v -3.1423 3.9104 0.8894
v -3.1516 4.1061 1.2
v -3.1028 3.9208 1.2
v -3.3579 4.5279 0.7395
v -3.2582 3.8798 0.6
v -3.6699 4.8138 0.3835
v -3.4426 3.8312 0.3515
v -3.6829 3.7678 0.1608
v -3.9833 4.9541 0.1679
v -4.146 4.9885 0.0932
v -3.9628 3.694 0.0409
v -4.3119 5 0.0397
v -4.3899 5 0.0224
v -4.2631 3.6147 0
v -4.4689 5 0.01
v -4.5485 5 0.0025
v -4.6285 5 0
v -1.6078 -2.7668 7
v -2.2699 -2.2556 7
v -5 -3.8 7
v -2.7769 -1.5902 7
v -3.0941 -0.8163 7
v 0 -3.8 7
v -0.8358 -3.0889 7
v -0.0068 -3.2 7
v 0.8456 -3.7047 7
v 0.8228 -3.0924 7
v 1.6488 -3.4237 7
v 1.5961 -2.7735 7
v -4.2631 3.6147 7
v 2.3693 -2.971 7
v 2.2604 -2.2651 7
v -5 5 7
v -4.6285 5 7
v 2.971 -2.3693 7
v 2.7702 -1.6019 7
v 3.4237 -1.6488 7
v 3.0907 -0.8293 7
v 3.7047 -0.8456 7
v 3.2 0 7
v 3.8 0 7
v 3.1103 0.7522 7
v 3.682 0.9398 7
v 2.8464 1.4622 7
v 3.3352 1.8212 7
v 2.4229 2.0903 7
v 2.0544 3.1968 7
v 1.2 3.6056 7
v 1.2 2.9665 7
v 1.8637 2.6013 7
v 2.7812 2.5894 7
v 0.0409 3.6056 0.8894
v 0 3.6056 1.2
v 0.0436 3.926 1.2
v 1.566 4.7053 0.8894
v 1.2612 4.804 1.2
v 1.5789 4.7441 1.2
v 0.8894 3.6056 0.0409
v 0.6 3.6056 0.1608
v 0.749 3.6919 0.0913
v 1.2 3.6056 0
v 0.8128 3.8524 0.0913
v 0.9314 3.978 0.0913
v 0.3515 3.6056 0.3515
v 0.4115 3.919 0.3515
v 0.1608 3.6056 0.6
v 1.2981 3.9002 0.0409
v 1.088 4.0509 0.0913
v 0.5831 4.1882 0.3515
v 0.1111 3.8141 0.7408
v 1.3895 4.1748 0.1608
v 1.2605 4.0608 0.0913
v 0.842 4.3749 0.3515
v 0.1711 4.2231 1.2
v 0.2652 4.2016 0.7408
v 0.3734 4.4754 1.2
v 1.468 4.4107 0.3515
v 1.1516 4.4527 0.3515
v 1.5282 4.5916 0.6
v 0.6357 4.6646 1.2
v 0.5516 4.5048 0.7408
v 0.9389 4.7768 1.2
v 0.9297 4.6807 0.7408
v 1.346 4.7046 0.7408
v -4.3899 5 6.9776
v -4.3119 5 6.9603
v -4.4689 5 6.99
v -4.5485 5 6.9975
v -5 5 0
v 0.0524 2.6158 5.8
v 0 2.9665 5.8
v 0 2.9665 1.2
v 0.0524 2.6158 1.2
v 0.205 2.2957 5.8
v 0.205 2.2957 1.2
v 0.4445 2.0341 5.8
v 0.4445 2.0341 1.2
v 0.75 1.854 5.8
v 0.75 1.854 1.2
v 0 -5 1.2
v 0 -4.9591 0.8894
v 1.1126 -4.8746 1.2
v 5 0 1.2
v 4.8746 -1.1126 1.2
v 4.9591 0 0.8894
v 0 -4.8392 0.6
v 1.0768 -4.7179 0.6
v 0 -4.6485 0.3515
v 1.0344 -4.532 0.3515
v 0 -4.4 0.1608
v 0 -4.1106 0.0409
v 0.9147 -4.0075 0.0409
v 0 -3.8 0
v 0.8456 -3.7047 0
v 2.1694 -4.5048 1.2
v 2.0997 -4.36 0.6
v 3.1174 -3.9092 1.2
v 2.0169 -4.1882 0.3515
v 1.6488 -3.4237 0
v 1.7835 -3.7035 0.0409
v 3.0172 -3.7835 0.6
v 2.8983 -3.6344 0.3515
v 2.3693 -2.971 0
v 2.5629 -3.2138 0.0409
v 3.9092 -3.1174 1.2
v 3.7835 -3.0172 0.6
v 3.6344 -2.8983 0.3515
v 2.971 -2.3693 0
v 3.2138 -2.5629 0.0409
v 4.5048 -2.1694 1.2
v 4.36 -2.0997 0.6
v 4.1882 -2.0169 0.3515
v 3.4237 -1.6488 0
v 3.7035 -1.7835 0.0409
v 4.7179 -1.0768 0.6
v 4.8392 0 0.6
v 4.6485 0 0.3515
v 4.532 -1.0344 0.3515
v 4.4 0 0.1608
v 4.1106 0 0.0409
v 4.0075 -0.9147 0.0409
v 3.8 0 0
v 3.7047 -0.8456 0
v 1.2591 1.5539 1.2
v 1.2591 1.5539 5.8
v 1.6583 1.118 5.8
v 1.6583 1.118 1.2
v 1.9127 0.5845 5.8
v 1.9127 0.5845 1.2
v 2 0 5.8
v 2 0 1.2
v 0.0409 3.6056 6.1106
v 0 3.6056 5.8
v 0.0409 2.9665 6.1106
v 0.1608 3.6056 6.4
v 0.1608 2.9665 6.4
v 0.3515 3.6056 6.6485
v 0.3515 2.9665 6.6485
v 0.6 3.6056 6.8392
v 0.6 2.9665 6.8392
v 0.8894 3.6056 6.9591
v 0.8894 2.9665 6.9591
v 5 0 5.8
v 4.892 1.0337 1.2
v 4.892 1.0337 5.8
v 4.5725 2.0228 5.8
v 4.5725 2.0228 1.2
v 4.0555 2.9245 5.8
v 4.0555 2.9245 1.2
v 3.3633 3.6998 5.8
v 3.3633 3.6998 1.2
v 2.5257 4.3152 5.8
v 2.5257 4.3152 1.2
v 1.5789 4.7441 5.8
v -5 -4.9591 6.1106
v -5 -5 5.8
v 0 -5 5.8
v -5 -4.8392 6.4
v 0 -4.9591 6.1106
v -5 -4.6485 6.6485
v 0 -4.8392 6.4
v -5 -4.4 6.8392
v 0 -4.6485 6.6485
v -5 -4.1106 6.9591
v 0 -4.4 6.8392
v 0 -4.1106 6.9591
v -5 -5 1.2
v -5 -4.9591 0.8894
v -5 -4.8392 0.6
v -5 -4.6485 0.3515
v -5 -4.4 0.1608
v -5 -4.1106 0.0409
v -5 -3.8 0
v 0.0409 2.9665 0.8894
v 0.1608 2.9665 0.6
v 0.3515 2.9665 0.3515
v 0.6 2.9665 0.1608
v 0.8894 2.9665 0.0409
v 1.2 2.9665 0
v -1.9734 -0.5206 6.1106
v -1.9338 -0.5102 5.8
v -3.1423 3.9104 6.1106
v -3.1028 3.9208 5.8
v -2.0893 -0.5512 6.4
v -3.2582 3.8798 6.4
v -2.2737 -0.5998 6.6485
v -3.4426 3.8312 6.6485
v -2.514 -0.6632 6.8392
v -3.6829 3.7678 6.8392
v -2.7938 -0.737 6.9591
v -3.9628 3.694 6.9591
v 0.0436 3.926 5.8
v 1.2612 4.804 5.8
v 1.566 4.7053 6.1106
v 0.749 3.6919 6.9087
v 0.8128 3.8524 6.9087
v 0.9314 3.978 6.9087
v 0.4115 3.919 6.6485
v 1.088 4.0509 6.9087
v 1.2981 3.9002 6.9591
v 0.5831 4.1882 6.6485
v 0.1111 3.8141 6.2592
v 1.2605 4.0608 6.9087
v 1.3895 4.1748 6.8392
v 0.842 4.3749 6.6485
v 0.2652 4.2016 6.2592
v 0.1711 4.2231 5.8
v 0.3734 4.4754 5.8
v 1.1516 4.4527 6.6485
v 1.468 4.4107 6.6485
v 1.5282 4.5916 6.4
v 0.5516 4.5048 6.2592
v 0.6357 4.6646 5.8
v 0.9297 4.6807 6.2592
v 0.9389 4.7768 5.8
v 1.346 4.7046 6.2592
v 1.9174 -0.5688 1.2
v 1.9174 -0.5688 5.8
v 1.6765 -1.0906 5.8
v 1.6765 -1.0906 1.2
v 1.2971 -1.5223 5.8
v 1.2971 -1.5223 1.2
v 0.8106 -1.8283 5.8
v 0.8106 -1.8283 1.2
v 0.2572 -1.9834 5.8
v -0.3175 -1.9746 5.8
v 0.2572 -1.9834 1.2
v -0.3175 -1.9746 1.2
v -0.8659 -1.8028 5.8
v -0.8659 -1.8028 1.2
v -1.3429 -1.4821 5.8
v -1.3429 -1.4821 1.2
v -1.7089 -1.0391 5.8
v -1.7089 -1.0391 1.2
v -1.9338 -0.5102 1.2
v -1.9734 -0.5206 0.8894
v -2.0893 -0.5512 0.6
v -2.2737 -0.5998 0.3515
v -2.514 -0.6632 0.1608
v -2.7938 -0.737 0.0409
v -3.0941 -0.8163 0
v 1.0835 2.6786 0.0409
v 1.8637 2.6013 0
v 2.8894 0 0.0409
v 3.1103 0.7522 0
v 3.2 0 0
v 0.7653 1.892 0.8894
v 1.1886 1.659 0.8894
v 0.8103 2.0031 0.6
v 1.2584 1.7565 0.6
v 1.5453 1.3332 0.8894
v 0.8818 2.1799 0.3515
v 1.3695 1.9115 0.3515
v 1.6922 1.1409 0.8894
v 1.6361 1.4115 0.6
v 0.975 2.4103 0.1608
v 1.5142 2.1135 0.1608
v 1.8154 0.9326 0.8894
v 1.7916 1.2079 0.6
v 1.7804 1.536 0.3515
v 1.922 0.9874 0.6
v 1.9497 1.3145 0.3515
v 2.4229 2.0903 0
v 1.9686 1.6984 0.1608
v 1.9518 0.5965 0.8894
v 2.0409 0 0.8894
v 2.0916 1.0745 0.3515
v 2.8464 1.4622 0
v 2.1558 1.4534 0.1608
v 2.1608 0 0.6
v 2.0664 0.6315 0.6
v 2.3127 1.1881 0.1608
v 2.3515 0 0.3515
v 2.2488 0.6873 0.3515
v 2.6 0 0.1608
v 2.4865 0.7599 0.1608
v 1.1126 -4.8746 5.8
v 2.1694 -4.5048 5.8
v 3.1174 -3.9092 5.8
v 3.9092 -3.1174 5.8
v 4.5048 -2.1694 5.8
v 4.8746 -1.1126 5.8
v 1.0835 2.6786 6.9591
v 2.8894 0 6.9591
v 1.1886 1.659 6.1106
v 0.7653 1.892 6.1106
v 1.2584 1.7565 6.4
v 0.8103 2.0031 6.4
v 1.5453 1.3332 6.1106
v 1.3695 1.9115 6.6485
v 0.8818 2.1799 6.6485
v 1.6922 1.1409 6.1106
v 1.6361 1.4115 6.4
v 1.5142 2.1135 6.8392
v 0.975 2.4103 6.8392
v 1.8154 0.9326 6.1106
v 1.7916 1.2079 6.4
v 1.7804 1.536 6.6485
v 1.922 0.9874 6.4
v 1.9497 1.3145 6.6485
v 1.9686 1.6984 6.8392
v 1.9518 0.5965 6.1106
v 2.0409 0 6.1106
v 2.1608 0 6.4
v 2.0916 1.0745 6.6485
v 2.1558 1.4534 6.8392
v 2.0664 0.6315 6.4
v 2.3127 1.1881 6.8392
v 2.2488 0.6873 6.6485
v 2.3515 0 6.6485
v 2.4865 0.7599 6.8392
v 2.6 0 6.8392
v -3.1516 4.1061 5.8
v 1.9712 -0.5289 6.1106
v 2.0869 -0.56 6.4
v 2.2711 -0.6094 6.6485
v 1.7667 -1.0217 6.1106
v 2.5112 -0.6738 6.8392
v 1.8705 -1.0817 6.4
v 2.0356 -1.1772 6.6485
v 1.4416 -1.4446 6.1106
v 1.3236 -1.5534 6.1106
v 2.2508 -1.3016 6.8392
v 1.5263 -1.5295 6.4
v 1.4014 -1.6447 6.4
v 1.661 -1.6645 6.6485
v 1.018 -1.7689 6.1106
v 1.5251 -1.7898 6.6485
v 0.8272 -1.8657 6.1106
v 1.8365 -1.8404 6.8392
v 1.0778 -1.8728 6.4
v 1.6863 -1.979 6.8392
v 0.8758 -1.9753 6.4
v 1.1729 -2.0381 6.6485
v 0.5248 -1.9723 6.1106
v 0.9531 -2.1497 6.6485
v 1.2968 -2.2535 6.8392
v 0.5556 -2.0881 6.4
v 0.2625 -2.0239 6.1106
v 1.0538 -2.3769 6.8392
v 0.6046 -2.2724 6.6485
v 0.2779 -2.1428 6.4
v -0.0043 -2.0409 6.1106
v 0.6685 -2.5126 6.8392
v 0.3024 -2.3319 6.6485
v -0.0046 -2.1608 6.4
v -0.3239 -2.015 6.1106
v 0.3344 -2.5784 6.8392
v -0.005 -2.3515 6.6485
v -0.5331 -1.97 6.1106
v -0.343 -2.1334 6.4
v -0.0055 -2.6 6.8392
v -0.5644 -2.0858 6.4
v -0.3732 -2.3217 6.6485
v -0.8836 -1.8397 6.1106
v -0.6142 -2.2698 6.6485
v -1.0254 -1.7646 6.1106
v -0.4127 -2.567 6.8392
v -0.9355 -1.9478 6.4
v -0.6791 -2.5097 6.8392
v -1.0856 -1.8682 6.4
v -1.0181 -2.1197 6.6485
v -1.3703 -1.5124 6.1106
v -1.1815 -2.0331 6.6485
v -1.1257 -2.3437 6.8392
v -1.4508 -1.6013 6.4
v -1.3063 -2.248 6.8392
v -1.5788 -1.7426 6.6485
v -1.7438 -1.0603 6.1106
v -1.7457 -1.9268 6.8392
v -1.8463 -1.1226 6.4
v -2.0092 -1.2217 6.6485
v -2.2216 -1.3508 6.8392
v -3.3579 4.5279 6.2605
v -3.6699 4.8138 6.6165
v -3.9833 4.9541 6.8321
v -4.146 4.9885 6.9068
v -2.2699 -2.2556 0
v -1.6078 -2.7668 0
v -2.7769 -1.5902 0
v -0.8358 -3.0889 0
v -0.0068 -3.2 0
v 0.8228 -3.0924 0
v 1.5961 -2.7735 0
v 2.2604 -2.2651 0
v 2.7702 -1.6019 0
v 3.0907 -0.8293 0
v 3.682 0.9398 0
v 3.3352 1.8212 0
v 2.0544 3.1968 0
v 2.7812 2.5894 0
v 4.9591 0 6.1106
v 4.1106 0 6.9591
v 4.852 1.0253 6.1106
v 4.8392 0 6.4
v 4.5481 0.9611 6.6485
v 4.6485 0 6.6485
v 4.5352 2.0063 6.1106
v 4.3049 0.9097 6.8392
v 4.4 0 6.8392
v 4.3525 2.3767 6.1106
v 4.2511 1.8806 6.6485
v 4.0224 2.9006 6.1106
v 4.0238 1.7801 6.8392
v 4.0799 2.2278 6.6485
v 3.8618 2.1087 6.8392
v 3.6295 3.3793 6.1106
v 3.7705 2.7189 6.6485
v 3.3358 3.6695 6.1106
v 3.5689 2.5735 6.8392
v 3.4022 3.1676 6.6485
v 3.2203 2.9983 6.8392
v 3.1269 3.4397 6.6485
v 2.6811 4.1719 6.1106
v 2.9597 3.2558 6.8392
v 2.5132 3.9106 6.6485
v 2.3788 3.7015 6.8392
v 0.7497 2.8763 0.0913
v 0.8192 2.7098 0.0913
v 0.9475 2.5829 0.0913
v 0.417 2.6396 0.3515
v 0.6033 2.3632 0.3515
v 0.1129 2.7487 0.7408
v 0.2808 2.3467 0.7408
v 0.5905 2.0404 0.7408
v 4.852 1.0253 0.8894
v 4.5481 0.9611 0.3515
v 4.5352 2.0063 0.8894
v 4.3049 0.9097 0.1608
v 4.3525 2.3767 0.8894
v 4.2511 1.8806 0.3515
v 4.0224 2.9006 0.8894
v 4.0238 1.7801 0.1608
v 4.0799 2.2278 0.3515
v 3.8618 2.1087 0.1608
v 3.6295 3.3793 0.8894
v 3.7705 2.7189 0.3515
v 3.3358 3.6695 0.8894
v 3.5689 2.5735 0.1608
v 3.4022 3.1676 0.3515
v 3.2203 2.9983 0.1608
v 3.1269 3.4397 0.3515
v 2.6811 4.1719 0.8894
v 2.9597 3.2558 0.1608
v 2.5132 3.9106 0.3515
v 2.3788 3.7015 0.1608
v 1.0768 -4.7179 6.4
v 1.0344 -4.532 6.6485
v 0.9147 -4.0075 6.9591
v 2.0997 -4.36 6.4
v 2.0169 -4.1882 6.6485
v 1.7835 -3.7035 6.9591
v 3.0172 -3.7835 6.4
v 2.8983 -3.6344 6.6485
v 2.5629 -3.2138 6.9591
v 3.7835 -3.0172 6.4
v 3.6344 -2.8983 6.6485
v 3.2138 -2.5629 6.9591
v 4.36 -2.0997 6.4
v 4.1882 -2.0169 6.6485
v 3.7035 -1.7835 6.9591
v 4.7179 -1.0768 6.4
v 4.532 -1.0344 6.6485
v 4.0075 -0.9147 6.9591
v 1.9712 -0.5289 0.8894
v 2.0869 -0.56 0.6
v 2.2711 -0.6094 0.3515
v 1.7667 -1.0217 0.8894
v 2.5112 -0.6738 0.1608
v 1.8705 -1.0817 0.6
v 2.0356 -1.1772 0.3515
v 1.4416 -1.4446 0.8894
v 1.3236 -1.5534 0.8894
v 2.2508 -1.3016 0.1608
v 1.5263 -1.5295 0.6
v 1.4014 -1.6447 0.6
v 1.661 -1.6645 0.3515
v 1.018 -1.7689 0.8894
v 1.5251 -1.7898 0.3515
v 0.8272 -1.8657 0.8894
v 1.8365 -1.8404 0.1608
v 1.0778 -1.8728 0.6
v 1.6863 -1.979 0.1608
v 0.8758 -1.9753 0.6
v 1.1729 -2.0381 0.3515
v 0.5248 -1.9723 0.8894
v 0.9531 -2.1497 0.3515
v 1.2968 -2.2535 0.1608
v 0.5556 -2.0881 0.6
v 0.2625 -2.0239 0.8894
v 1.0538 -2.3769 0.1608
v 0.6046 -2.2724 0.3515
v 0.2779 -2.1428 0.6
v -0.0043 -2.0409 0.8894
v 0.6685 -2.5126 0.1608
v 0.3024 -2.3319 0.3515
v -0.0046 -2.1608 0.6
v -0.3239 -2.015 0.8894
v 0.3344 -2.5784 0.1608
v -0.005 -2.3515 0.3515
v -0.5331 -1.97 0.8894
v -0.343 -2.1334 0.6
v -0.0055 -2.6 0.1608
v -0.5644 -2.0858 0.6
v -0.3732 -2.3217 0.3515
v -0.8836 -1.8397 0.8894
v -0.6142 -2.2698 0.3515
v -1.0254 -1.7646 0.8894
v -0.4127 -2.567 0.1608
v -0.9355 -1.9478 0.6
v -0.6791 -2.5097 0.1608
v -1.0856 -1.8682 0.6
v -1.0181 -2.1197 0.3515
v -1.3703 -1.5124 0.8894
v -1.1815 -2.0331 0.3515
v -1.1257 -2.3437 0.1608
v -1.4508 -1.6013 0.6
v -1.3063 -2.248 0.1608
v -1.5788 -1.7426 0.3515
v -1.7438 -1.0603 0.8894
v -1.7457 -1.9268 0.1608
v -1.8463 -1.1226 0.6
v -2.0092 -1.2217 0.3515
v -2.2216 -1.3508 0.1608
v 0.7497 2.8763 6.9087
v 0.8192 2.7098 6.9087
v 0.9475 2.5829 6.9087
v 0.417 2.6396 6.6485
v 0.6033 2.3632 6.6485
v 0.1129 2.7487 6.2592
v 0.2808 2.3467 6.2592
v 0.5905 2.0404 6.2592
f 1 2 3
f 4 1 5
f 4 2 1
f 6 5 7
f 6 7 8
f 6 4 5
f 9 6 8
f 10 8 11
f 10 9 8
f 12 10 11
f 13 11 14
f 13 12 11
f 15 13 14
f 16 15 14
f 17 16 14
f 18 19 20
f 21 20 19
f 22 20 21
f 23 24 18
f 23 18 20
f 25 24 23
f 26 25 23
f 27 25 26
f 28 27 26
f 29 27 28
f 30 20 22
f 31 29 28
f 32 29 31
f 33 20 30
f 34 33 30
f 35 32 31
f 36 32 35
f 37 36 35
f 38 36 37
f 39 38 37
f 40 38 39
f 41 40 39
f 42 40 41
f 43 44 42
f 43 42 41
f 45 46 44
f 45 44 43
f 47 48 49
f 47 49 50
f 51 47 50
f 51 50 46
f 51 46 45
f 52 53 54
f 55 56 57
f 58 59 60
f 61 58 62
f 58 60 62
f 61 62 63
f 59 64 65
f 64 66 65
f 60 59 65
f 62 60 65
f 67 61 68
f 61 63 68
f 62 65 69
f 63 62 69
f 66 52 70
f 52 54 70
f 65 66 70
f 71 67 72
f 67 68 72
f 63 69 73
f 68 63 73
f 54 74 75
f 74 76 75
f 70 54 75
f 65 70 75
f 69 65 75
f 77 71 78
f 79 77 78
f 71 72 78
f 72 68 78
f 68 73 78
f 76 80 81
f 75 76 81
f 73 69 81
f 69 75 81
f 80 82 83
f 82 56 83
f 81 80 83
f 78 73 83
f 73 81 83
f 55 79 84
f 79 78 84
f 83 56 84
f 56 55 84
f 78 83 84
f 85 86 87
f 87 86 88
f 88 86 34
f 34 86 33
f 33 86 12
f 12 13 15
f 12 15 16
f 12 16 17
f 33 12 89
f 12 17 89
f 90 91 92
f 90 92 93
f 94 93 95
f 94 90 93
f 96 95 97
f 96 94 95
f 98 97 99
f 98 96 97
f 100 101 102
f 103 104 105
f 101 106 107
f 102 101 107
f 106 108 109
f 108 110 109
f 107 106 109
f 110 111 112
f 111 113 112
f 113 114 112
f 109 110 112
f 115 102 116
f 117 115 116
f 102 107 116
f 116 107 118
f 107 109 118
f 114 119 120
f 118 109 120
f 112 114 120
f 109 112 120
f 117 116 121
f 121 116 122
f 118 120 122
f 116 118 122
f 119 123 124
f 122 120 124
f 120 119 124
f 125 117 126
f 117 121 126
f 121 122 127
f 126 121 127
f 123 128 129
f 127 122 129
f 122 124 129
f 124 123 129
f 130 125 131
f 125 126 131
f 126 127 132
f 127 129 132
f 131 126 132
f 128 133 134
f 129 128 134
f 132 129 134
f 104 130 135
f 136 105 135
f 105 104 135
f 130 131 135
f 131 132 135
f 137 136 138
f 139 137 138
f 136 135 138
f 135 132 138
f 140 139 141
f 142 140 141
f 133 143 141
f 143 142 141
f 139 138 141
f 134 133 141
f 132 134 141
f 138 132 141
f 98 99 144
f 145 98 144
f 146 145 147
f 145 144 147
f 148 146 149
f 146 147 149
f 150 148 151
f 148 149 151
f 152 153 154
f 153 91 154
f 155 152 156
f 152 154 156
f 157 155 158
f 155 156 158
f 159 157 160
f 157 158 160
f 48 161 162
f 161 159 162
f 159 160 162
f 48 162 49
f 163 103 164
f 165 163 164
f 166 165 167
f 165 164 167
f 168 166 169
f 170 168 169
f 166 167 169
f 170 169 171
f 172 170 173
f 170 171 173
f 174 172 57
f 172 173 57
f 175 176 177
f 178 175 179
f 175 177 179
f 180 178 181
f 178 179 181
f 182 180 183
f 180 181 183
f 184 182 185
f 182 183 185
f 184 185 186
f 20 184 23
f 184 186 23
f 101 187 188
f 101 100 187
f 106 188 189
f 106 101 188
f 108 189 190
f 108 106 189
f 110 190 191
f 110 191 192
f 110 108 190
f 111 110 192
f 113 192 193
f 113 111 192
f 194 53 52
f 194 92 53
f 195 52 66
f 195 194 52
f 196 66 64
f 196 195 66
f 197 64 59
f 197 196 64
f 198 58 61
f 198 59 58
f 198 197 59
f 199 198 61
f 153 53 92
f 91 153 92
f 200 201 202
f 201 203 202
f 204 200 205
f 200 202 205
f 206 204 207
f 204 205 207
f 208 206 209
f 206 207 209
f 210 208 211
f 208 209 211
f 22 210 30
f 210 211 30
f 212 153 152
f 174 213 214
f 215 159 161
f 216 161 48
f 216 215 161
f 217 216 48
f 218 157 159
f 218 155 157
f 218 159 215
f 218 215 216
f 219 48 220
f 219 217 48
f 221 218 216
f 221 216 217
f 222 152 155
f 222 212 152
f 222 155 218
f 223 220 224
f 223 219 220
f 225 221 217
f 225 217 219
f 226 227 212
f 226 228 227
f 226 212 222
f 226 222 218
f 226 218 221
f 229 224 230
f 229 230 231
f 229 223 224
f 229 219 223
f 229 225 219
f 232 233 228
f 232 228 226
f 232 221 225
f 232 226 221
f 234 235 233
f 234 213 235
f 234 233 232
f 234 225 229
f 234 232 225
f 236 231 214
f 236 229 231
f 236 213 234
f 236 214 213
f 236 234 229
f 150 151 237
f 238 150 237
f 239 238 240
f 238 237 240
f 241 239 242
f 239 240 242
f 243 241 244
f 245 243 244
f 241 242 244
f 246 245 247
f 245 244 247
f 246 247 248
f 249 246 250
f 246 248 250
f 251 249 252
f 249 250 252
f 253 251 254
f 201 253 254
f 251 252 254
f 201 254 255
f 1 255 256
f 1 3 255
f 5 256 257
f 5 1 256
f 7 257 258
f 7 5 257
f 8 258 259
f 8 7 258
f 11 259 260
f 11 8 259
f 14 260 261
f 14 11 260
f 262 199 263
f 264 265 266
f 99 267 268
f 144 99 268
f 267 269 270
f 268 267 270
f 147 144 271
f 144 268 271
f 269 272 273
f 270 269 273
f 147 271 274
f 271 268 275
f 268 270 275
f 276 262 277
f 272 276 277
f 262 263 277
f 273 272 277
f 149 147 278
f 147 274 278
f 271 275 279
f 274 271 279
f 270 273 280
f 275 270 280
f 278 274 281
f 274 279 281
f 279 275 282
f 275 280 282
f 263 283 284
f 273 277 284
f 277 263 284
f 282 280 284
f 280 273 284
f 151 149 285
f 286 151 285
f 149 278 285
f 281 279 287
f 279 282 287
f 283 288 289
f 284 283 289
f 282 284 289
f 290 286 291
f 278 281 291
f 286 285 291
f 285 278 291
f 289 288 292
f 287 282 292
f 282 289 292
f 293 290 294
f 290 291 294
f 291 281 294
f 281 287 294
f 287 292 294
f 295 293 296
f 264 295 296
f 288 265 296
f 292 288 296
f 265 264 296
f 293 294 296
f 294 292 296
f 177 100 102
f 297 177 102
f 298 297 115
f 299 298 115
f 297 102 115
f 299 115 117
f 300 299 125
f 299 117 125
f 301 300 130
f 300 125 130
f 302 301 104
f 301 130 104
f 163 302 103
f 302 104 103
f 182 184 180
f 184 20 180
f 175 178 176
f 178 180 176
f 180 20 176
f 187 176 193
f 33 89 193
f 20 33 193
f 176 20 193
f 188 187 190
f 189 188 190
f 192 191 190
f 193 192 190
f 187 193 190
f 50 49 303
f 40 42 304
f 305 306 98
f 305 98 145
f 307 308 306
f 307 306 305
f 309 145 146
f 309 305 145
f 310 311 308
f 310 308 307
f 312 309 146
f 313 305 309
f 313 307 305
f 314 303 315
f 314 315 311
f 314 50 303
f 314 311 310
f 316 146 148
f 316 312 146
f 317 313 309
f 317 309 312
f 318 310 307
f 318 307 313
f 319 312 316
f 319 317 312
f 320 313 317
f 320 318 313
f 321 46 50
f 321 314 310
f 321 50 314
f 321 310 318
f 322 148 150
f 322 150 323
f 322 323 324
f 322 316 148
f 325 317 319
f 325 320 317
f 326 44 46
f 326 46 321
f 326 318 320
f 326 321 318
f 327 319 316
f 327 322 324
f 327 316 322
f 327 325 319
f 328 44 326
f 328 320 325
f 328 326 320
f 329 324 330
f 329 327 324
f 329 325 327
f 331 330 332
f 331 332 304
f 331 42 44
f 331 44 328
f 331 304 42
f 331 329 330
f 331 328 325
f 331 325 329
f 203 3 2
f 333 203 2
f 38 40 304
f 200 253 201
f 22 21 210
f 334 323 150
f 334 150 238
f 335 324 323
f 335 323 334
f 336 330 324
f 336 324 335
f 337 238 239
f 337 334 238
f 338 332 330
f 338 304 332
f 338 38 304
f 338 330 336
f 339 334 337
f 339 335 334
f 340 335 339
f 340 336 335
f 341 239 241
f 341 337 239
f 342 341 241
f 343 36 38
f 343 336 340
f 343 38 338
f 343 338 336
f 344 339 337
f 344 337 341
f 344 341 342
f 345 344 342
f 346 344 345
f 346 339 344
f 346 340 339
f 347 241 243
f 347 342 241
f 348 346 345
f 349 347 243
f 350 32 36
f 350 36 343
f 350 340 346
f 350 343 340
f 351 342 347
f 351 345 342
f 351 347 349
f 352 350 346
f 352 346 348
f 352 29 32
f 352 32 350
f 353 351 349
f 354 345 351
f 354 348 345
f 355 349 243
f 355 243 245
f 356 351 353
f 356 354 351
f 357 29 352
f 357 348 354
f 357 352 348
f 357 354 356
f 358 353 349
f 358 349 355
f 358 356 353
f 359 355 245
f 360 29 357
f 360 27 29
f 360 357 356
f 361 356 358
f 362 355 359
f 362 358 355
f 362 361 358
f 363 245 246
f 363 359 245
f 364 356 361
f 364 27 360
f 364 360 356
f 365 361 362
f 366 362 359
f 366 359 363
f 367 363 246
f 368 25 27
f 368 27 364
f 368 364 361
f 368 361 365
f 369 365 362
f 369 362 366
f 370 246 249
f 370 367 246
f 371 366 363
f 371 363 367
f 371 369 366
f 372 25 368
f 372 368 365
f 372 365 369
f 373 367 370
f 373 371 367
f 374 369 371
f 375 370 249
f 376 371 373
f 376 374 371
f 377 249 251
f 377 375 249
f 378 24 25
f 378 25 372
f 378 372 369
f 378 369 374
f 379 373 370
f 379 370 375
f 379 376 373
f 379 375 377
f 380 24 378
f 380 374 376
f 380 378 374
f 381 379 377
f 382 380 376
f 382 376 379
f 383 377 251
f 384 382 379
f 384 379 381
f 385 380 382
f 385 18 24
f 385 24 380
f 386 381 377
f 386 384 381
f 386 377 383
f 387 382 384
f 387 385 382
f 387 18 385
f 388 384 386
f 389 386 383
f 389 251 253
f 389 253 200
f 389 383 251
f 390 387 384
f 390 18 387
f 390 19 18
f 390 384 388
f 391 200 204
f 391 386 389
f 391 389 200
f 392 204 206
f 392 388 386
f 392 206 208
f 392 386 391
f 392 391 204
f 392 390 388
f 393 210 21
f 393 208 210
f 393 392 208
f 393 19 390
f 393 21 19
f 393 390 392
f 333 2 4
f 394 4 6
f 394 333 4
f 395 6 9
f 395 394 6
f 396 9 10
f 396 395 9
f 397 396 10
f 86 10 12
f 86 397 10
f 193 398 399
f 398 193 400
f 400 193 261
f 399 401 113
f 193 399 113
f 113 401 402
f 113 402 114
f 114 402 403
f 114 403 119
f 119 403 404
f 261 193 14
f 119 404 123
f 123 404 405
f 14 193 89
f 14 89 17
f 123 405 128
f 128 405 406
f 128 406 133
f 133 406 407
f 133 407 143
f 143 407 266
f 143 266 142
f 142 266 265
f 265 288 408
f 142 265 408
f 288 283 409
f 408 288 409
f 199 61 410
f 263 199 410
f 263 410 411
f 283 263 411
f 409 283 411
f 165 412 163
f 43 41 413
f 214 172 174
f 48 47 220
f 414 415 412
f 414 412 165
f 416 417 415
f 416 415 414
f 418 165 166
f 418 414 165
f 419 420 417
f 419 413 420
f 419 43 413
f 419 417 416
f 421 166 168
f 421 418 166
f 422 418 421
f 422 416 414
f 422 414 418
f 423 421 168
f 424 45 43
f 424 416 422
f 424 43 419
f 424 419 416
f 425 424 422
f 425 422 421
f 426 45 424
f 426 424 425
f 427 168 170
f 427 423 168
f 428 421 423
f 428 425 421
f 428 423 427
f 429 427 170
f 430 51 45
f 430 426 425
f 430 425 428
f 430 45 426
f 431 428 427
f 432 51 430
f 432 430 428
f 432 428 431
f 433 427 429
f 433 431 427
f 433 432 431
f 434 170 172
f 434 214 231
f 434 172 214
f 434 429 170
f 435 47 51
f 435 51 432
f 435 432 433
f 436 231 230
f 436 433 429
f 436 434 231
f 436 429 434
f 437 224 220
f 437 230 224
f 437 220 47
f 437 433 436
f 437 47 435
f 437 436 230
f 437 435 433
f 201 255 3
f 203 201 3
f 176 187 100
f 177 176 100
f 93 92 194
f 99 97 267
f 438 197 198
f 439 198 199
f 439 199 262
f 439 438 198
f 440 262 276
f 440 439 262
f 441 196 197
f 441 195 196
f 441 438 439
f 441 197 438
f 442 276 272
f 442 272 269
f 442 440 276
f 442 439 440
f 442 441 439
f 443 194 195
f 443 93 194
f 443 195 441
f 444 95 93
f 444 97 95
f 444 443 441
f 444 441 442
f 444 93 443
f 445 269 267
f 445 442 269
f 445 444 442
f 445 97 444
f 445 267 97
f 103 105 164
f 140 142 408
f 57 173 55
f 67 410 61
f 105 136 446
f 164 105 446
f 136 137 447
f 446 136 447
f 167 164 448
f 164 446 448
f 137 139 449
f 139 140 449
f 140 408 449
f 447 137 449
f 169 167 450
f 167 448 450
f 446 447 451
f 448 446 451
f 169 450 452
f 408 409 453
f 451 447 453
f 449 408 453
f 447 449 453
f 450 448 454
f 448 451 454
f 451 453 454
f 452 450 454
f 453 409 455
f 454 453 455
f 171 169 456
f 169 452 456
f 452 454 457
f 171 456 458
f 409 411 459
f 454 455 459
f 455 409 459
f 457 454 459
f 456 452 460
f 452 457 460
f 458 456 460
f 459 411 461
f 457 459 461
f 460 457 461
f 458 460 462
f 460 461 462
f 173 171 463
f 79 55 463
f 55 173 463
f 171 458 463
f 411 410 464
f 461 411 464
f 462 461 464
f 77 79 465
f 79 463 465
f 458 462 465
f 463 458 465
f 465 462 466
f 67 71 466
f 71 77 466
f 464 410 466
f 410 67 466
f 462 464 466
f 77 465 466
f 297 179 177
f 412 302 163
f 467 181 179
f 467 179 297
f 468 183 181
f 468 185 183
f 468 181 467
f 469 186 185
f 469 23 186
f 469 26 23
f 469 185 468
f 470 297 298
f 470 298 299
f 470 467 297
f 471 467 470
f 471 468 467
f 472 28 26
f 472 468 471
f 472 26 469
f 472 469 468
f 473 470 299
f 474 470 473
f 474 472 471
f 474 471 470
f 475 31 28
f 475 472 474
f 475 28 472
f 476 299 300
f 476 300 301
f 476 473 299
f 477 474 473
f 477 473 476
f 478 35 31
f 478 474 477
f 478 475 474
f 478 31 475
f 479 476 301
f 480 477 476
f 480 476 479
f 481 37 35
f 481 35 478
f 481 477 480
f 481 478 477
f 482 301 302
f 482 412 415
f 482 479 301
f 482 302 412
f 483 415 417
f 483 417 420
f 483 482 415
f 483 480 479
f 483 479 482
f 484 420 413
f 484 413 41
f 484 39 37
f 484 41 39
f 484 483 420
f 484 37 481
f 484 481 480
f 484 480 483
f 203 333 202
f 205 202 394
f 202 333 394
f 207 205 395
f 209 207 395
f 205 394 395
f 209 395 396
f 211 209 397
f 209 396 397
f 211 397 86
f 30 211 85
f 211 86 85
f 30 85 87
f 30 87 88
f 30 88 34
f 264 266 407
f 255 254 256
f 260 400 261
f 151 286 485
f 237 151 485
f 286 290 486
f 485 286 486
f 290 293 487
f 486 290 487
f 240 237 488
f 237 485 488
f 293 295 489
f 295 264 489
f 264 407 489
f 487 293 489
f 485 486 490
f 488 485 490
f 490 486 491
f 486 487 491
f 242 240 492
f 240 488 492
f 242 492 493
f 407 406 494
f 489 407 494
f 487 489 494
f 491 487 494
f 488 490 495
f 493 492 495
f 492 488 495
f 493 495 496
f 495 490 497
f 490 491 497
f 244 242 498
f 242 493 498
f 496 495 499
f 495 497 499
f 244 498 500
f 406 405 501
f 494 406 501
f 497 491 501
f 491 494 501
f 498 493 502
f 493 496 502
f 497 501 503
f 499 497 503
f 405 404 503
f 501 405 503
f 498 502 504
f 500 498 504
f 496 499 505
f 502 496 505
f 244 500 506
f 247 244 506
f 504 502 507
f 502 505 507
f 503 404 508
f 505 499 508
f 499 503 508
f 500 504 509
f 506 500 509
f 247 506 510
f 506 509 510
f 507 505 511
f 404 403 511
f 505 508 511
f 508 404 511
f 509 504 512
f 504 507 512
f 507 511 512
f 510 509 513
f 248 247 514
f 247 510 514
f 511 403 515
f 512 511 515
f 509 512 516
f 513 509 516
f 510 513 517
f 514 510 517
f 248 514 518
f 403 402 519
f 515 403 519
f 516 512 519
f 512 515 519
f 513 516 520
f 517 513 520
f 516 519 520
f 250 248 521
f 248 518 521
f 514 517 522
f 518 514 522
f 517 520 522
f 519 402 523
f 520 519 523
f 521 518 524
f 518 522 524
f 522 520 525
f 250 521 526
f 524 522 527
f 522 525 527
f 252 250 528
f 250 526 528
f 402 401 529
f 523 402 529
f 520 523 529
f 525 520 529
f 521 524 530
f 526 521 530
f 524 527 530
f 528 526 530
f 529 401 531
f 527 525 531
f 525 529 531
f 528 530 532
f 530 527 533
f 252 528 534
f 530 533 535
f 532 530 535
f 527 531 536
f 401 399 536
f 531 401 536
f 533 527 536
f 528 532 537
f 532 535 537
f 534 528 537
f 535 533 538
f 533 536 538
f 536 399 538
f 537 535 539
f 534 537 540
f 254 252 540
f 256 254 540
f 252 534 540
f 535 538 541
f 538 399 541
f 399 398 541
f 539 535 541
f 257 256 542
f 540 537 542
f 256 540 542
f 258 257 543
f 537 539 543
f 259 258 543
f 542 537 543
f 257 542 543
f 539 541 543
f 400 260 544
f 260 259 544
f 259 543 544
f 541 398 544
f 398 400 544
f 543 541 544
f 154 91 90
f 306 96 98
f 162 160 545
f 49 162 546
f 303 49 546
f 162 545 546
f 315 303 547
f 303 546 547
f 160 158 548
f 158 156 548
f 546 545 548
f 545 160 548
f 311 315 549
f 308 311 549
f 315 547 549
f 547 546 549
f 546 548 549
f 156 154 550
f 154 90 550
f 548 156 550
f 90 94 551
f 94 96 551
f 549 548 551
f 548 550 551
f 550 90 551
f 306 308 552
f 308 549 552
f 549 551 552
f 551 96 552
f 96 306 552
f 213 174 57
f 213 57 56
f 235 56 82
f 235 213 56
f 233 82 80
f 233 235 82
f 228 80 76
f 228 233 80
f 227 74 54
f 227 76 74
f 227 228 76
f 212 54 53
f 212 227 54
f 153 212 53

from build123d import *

# Parameters (mm, degrees)
F1_DEPTH = 7
F2_R     = 1.2


# Not quite as in the source:
# - a feature names something its author has since deleted; it is built from what else it names


with BuildPart() as f1:
    # F0 (on Top) → F1 (new body)
    with BuildSketch(Plane.XY):
        with BuildLine():
            Line((-5, -5), (0, -5))
            ThreePointArc((0, -5), (-3.5355339059, -3.5355339059), (-5, 0))
            Line((-5, 0), (-5, -5))
        make_face()
        with BuildLine():
            ThreePointArc((0, -5), (3.5355339059, -3.5355339059), (5, 0))
            ThreePointArc((5, 0), (3.5355339059, 3.5355339059), (0, 5))
            Line((0, 5), (0, 2))
            ThreePointArc((0, 2), (1.4142135624, 1.4142135624), (2, 0))
            ThreePointArc((2, 0), (0.2572150448, -1.9833911416), (-1.9338404207, -0.5101580414))
            Line((-1.9338404207, -0.5101580414), (-3.1027593412, 3.9208270136))
            ThreePointArc((-3.1027593412, 3.9208270136), (-4.5007664184, 2.177866306), (-5, 0))
            ThreePointArc((-5, 0), (-3.5355339059, -3.5355339059), (0, -5))
        make_face()
        with BuildLine():
            ThreePointArc((-5, 0), (-4.5007664184, 2.177866306), (-3.1027593412, 3.9208270136))
            Line((-3.1027593412, 3.9208270136), (-3.3874512792, 5))
            Line((-3.3874512792, 5), (-5, 5))
            Line((-5, 5), (-5, 0))
        make_face()
    extrude(amount=F1_DEPTH)

    # F2
    f2_edges = [f1.edges().sort_by_distance(p)[0] for p in [
        (1.584348, -1.220591, 0),
        (1.584348, -1.220591, 7),
        (5, 0, 0),
        (5, 0, 7),
        (0, 5, 3.5),
        (0, 2, 3.5),
        (0, 3.5, 7),
        (0, 3.5, 0),
        (-3.387451, 5, 3.5),
        (-2.5, -5, 0),
        (-2.5, -5, 7),
        (-2.660646, 2.244921, 0),
        (-2.660646, 2.244921, 7),
    ]]
    fillet(f2_edges, radius=F2_R)


solid = f1.part
